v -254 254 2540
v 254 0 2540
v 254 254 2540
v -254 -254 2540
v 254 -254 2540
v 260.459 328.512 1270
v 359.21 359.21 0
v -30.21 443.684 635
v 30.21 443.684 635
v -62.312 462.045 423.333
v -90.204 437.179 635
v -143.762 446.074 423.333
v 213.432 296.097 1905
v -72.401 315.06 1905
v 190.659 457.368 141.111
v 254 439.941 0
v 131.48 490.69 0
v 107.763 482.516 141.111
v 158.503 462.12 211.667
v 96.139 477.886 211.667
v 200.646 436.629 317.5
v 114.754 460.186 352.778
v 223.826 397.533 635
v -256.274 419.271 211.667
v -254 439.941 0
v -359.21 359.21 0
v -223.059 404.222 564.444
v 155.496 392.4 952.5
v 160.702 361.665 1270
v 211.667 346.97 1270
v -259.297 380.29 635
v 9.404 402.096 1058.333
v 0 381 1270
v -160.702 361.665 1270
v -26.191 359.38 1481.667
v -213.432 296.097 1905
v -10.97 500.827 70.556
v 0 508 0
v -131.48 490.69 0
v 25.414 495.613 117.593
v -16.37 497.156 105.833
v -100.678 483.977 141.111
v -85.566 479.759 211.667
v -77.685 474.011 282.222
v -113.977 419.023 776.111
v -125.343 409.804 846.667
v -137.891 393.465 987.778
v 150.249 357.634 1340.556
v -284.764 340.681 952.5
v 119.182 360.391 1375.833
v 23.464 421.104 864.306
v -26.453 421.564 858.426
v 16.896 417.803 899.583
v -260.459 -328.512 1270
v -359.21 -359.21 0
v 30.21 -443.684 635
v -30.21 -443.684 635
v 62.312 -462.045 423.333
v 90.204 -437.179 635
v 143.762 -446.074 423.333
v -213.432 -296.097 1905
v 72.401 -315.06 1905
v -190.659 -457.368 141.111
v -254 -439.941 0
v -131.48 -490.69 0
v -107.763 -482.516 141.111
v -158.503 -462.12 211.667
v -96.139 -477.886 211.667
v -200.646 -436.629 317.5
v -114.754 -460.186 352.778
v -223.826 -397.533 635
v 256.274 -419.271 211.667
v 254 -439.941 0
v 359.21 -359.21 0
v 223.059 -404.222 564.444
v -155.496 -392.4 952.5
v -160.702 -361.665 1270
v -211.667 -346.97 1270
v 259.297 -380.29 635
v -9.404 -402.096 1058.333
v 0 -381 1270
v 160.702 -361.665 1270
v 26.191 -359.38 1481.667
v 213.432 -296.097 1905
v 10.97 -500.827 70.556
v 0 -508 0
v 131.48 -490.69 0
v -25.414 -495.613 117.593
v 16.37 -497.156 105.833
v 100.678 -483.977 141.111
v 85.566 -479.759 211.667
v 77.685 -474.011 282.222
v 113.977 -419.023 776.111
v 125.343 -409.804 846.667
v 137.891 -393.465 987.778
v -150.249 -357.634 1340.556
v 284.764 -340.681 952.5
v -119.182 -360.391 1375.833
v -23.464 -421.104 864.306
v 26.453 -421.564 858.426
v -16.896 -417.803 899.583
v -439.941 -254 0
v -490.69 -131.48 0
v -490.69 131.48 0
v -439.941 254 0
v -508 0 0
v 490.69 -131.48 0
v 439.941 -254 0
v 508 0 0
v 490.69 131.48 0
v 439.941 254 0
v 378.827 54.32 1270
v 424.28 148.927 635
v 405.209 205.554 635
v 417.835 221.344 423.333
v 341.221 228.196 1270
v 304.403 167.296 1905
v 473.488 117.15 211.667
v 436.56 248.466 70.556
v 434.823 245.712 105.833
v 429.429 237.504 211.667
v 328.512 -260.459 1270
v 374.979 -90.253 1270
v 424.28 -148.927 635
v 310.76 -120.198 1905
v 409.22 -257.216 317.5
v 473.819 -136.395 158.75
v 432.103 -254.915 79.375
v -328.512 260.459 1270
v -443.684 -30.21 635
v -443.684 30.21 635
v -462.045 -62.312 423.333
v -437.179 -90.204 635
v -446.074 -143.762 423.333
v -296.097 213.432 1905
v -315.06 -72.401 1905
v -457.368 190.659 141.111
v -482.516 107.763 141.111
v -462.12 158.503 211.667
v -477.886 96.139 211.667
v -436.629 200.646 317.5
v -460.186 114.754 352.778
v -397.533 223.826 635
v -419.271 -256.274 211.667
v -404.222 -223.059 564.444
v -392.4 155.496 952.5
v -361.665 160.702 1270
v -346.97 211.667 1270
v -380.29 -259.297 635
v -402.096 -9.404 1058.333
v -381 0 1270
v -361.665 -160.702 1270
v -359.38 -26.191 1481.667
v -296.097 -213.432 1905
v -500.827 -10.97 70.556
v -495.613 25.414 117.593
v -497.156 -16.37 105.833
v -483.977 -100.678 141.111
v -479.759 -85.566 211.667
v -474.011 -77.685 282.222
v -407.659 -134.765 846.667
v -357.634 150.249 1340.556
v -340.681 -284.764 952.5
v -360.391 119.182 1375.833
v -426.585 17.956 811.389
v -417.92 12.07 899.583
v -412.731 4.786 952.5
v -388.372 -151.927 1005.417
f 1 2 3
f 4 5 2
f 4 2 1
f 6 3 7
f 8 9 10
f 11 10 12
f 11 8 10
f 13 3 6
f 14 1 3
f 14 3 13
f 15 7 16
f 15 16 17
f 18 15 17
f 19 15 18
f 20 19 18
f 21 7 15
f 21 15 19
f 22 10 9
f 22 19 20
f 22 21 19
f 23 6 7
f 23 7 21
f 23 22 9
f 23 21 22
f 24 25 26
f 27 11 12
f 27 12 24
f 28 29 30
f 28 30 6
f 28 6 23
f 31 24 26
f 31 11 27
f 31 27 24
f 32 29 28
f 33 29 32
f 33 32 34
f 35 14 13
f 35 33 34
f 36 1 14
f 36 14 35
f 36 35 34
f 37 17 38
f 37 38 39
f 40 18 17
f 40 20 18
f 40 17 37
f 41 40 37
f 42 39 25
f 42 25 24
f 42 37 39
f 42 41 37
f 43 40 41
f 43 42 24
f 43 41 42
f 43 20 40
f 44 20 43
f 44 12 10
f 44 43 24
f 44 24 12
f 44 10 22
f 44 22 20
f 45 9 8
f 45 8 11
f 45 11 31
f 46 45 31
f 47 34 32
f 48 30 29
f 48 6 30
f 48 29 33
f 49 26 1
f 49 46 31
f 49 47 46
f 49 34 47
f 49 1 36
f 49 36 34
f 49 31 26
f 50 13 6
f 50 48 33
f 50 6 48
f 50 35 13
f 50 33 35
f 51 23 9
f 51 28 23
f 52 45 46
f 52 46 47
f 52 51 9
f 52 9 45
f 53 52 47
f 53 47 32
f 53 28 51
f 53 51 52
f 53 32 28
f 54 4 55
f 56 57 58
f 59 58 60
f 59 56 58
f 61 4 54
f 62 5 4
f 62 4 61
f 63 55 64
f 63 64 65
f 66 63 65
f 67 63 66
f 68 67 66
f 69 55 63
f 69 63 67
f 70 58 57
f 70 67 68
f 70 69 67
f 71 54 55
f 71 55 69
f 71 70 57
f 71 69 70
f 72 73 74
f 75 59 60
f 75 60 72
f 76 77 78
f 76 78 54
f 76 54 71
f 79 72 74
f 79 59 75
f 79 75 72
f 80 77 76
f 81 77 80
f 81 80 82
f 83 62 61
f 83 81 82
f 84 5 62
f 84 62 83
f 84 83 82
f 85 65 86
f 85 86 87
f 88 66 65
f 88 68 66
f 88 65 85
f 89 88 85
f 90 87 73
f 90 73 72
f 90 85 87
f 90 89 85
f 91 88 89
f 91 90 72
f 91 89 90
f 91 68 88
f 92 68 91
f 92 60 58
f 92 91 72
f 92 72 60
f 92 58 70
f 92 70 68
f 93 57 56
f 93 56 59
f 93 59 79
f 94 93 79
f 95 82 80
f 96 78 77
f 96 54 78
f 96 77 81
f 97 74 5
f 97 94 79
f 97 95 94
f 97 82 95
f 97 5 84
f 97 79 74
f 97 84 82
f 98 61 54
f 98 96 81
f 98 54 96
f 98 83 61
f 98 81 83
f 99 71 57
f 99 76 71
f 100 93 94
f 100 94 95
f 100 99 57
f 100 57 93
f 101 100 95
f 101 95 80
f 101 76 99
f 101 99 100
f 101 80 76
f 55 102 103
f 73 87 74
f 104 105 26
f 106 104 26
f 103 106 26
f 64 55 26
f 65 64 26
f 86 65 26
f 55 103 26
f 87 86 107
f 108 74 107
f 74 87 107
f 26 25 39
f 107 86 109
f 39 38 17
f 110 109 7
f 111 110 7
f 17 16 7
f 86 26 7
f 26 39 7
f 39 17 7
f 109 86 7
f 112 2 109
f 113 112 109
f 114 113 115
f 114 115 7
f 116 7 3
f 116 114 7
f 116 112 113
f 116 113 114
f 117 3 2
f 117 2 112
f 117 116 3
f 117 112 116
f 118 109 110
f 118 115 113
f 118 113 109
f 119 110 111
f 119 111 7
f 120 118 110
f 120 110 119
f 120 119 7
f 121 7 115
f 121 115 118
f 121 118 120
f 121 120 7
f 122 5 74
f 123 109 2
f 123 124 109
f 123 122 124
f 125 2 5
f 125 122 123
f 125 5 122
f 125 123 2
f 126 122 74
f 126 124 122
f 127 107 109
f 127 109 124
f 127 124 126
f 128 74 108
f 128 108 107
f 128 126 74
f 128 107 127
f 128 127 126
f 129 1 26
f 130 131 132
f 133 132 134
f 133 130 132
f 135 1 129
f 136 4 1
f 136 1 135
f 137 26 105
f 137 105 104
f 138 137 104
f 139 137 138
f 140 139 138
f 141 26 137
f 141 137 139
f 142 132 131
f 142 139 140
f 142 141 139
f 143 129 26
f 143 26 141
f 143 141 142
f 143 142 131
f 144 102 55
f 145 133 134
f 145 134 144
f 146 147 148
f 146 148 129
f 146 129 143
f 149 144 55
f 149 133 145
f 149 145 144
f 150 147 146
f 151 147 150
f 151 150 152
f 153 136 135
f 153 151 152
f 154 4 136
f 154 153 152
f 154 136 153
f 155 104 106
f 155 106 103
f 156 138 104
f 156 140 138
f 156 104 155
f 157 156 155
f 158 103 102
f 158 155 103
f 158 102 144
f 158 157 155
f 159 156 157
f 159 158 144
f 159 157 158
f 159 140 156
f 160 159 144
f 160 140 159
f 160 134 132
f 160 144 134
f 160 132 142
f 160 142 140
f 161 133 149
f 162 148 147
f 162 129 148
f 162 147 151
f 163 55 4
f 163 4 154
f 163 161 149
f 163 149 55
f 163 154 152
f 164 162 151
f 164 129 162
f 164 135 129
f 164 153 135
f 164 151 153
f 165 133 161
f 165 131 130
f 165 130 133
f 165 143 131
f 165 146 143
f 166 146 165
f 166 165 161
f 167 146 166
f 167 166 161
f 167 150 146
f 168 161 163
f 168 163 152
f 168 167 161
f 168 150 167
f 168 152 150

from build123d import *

# Parameters (mm, degrees)
F0_R = 508
F2_W = 508
F2_H = 508


with BuildPart() as f3:
    # F0 (on Top) → F3 section 0
    with BuildSketch(Plane.XY):
        Circle(F0_R)
    # F2 (on offset) → F3 section 1
    with BuildSketch(Plane.XY.offset(2540)):
        Rectangle(F2_W, F2_H)
    loft()


solid = f3.part
